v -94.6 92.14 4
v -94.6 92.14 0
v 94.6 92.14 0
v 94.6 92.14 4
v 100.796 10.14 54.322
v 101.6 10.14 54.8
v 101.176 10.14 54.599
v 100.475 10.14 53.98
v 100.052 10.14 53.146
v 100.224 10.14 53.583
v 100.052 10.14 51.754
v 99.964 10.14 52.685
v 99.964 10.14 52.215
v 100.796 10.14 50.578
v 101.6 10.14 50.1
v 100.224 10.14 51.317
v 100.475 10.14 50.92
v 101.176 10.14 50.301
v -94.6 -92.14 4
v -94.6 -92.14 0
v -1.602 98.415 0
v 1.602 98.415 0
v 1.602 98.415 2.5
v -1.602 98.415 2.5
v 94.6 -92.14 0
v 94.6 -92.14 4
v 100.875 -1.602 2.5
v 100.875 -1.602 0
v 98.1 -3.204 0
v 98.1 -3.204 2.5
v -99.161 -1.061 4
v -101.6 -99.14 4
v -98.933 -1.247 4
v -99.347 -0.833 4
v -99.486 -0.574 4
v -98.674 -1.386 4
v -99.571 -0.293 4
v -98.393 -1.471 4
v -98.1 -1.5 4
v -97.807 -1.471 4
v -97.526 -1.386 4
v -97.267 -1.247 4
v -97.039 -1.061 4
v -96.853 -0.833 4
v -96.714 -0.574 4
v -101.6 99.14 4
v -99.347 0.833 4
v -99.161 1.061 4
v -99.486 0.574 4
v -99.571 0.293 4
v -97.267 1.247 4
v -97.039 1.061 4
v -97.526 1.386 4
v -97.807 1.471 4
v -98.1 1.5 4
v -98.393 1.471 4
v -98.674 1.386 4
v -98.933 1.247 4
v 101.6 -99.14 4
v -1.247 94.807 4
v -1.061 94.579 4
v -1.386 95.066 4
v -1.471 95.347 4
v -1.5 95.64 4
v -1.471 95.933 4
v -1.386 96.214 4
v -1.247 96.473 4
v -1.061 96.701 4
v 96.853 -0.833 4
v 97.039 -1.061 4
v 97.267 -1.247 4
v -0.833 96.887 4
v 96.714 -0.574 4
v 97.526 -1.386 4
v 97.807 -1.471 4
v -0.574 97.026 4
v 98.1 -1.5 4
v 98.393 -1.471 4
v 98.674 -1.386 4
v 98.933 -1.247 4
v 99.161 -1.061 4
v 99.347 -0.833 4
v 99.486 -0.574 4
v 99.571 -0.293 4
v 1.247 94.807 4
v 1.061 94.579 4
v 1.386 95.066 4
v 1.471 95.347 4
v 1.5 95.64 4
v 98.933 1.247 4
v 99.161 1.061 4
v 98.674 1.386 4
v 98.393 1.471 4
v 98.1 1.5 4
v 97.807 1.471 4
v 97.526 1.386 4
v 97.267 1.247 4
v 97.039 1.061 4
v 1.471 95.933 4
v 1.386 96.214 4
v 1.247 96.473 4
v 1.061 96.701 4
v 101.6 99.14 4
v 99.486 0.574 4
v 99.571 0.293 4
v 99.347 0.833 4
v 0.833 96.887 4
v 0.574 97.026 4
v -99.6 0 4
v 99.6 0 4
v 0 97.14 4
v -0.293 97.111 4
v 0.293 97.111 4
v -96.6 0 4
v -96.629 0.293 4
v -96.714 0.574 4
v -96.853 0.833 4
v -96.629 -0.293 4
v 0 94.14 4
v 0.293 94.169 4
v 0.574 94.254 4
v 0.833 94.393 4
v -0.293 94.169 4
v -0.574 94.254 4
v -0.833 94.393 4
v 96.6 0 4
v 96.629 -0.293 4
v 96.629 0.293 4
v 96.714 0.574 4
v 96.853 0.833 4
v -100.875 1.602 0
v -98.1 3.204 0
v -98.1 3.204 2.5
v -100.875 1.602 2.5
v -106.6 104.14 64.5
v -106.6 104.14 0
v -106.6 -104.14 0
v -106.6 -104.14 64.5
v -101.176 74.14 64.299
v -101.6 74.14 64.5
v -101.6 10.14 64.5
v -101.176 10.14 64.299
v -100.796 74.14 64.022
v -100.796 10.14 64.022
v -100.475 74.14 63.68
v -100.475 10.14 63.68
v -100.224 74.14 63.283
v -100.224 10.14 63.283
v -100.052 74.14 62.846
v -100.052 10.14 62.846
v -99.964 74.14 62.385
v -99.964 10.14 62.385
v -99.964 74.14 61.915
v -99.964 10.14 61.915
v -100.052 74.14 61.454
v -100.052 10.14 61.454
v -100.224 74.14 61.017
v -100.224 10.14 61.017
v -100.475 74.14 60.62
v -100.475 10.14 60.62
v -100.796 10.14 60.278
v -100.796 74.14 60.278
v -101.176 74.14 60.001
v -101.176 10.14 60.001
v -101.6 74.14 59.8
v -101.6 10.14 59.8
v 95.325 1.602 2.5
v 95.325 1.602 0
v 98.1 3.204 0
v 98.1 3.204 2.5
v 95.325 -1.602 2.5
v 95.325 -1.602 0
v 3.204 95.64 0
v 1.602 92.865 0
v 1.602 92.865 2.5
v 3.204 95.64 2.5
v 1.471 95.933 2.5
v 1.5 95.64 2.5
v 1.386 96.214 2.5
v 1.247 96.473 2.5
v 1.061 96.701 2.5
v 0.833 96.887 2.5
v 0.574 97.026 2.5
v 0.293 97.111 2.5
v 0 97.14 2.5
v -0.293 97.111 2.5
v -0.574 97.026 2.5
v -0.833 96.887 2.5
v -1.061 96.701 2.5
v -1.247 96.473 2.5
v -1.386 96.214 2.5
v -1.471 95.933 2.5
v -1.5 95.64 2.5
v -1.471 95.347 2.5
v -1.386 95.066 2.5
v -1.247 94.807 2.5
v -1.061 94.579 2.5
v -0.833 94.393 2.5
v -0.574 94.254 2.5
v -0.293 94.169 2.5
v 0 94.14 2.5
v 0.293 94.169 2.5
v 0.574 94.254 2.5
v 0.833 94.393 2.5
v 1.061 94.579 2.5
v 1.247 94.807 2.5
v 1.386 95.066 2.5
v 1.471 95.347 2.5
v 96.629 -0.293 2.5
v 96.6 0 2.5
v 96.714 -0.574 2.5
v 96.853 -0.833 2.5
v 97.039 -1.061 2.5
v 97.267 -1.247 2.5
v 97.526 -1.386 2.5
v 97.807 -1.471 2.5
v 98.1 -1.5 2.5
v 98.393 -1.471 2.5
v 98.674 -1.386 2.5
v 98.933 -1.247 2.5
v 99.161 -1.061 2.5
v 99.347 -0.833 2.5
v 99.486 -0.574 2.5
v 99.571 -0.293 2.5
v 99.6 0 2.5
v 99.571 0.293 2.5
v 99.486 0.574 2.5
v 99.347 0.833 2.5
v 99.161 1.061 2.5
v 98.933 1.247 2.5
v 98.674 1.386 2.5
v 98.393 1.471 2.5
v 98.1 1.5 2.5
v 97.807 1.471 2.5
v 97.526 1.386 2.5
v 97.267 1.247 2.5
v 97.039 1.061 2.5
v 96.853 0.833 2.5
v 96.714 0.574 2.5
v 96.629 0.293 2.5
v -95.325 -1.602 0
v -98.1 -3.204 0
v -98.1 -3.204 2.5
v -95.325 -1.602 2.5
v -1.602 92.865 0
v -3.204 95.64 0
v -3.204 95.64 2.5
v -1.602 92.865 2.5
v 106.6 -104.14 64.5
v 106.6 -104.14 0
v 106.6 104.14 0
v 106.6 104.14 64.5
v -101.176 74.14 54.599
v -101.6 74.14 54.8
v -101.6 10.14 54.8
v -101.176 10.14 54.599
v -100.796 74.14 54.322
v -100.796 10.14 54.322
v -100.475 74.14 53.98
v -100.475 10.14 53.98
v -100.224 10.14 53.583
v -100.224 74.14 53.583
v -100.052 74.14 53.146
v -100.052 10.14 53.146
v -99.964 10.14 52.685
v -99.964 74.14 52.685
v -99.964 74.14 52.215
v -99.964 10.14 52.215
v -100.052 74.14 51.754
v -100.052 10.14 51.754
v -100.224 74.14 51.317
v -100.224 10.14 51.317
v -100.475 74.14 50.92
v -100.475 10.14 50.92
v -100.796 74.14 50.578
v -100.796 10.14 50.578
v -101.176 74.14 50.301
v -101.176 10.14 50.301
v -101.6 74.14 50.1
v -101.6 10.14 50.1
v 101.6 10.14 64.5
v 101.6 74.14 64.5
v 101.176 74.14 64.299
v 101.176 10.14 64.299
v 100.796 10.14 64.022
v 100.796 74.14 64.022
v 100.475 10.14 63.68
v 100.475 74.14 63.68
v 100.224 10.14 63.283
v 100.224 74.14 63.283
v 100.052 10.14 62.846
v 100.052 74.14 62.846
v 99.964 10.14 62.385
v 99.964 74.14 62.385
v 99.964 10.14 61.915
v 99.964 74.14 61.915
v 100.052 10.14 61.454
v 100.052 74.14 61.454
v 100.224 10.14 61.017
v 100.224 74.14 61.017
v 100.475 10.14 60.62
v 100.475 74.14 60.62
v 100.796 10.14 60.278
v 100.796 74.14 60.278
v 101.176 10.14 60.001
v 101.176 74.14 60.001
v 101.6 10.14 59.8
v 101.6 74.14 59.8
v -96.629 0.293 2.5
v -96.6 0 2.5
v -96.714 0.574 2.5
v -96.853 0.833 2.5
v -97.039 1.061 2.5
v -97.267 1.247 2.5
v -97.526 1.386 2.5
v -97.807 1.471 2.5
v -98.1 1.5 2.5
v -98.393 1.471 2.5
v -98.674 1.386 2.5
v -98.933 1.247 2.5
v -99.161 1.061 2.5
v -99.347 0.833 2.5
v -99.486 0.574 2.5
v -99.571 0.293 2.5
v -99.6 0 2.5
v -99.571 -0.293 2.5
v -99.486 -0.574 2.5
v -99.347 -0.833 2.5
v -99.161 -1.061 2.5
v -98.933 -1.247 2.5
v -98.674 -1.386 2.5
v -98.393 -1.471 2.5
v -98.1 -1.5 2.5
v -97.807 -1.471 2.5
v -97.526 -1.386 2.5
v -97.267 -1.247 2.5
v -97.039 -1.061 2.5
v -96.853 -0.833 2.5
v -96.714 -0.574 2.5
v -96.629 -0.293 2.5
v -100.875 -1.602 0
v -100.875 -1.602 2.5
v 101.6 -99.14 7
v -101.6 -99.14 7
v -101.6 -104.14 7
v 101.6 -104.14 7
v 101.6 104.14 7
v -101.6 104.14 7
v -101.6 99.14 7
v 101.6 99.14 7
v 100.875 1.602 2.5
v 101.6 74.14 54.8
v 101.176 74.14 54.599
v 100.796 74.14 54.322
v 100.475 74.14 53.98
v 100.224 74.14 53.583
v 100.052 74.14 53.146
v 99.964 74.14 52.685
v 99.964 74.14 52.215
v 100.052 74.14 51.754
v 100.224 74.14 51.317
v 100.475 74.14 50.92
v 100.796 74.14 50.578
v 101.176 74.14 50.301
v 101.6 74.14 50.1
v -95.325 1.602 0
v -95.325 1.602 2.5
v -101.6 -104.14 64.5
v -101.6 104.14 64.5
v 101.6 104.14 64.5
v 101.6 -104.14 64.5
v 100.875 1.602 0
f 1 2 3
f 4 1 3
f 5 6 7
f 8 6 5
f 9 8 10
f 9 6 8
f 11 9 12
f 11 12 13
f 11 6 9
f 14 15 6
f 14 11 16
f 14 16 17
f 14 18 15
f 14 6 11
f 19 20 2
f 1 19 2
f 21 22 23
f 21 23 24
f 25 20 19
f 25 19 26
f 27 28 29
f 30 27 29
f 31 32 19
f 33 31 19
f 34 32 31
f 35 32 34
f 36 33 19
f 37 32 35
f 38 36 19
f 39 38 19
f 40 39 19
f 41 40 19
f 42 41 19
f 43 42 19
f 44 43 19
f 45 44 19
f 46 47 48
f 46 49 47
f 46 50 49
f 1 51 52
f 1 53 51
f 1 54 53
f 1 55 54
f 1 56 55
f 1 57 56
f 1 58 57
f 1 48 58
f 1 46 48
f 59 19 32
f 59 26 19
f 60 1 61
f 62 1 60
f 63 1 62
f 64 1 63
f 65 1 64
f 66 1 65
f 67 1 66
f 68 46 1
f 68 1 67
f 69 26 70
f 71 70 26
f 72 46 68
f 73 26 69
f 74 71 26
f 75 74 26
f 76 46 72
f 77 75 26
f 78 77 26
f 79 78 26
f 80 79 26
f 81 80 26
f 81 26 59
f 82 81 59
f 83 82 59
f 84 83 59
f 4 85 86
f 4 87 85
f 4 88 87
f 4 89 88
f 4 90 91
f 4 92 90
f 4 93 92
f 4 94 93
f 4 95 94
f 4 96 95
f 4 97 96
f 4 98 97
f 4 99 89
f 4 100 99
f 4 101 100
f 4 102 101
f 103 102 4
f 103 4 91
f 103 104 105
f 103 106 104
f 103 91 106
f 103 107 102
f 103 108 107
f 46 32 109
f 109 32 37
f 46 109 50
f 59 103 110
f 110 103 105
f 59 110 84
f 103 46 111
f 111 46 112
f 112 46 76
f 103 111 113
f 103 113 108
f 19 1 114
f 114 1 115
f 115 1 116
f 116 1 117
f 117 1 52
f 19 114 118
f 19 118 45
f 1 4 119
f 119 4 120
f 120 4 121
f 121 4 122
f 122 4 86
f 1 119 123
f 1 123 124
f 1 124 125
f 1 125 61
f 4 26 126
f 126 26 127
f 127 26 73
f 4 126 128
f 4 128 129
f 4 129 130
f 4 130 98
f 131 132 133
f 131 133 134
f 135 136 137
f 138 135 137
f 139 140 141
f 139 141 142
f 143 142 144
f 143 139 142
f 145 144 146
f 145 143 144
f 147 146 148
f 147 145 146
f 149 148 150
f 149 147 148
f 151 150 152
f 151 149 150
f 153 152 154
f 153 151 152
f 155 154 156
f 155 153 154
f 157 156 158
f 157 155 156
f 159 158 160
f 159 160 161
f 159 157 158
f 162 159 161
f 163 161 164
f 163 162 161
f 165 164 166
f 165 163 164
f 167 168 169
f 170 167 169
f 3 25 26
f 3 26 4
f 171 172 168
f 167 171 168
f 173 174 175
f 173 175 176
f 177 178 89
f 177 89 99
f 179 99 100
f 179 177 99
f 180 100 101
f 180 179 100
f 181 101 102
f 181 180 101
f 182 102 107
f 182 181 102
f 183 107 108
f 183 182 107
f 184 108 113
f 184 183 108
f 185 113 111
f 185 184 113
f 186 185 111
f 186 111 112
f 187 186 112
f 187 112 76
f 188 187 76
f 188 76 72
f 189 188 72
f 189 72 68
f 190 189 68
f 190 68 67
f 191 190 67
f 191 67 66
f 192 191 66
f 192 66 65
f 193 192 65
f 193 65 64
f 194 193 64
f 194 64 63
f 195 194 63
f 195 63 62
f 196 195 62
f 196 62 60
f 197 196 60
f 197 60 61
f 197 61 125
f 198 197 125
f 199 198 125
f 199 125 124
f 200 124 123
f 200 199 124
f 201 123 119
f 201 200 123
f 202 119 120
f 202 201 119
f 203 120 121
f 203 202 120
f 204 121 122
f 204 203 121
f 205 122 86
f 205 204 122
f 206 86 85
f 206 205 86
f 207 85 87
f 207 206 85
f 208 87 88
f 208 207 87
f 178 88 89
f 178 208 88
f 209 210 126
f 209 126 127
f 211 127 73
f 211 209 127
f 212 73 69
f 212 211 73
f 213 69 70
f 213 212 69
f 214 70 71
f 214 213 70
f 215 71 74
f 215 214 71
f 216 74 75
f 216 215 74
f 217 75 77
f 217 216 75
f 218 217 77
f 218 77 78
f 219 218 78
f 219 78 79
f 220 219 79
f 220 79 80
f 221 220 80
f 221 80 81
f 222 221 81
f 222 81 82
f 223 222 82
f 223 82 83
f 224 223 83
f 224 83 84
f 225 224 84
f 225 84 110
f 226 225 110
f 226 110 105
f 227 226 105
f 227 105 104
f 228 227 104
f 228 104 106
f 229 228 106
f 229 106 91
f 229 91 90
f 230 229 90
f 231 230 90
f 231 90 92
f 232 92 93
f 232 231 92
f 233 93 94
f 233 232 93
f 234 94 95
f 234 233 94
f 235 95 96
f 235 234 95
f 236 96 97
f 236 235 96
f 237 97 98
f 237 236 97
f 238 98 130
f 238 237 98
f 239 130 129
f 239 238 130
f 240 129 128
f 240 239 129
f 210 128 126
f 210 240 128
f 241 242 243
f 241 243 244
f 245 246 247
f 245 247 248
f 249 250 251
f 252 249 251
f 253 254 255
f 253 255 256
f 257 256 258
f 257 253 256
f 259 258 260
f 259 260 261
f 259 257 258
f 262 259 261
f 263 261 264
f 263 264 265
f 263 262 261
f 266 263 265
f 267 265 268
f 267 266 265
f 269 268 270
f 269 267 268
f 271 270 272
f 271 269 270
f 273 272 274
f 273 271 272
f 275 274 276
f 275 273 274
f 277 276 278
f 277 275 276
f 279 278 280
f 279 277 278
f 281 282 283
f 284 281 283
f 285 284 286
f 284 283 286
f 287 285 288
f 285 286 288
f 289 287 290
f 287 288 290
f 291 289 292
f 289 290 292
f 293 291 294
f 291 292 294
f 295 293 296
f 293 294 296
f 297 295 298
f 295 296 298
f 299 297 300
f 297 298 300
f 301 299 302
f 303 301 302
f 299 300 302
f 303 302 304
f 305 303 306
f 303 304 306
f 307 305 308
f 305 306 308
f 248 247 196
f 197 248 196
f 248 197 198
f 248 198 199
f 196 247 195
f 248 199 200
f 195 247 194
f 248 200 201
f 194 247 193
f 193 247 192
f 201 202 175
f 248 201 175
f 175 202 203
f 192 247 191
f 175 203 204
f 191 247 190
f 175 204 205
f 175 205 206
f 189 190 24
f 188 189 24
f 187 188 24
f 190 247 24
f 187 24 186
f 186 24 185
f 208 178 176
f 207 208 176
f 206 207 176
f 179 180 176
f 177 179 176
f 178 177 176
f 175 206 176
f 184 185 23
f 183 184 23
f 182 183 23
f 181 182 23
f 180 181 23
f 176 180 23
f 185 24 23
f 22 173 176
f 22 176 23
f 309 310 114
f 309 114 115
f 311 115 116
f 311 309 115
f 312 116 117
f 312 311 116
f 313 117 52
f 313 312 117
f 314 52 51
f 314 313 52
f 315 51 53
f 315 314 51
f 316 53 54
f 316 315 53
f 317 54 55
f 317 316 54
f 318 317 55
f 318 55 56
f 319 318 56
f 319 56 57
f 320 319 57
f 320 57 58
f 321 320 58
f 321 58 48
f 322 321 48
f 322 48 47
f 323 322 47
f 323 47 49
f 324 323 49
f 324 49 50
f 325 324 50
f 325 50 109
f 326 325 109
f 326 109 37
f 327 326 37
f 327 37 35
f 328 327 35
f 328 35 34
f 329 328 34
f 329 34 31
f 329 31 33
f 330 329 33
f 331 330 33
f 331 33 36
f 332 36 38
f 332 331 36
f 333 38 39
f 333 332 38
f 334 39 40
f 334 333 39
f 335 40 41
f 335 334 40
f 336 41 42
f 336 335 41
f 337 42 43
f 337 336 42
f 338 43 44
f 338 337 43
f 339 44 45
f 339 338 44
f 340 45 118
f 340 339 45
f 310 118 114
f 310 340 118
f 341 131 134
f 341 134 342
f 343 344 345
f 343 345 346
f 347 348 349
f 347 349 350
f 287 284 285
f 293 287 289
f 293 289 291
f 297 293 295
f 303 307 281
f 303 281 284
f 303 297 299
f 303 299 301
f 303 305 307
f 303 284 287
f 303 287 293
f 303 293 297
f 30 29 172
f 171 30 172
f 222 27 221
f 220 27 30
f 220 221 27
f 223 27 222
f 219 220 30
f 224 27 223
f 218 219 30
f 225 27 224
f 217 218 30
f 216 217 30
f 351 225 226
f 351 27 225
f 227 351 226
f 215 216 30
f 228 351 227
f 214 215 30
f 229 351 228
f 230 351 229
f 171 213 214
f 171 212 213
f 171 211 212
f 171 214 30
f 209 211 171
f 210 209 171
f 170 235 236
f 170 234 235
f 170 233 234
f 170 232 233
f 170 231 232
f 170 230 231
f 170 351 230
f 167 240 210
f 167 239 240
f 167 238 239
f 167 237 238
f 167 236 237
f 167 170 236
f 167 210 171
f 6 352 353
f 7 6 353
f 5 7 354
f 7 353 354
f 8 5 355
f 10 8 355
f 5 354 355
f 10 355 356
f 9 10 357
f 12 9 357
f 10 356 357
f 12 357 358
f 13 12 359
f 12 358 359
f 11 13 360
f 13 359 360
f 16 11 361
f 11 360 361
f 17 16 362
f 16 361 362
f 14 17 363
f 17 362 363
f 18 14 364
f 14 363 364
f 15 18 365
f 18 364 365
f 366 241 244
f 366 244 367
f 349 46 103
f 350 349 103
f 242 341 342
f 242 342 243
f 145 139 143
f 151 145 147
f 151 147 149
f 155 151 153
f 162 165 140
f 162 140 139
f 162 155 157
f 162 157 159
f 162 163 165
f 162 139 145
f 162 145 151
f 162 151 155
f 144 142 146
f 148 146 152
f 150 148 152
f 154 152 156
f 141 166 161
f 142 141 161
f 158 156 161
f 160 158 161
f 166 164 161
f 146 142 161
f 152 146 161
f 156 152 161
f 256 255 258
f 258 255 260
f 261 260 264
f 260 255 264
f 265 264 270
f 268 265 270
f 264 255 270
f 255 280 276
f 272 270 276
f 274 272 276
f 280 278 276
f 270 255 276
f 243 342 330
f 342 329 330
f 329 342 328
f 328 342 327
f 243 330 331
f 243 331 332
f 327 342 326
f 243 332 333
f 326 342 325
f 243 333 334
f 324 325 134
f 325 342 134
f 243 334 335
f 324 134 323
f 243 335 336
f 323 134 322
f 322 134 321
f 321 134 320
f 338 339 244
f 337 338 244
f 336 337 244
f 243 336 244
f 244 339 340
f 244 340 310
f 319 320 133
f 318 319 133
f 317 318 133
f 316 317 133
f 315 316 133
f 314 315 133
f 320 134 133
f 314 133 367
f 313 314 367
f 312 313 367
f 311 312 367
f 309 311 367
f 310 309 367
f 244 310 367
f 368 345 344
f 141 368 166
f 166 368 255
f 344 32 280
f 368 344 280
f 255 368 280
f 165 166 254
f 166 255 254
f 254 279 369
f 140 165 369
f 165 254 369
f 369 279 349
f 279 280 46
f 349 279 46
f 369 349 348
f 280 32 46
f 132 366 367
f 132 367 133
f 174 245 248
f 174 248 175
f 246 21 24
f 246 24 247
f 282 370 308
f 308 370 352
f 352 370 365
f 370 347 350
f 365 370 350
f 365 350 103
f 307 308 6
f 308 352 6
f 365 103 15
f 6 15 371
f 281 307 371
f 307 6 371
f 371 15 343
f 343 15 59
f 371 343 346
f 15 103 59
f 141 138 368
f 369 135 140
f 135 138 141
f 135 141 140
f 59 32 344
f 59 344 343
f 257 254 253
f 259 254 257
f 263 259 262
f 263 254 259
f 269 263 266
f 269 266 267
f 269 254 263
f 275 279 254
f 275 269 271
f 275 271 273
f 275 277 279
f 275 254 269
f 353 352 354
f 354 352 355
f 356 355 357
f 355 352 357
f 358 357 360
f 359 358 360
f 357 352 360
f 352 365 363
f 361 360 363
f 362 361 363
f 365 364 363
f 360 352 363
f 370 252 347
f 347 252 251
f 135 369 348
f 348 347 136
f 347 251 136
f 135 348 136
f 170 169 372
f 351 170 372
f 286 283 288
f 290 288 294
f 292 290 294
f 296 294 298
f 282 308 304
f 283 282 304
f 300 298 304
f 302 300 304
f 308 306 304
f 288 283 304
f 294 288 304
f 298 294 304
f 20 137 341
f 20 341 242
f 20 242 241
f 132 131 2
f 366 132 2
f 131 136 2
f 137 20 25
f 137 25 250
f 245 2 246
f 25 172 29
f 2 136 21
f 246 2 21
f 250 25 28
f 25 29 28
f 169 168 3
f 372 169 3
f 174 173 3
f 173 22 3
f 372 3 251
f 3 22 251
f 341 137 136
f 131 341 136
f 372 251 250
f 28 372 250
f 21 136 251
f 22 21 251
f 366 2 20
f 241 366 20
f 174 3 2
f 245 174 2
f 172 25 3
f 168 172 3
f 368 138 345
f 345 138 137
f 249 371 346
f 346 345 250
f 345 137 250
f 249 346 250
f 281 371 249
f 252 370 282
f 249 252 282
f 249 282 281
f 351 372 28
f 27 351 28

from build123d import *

# Parameters (mm, degrees)
SKETCH1_W           = 213.2
SKETCH1_H           = 208.28
SKETCH1_W_2         = 203.2
SKETCH1_H_2         = 198.28
BOSS_EXTRUDE1_DEPTH = 7
SKETCH2_W           = 203.2
SKETCH2_H           = 198.28
SKETCH2_R           = 1.5
SKETCH2_W_2         = 189.2
SKETCH2_H_2         = 184.28
BOSS_EXTRUDE2_DEPTH = 4
BOSS_EXTRUDE3_DEPTH = 57.5
BOSS_EXTRUDE4_START = -30
BOSS_EXTRUDE4_DEPTH = 64
CUT_EXTRUDE1_START  = -4
CUT_EXTRUDE1_DEPTH  = 2.5


with BuildPart() as part:
    # Sketch1 → Boss-Extrude1 (new body)
    with BuildSketch(Plane.XY):
        Rectangle(SKETCH1_W, SKETCH1_H)
        Rectangle(SKETCH1_W_2, SKETCH1_H_2, mode=Mode.SUBTRACT)
    extrude(amount=BOSS_EXTRUDE1_DEPTH)

    # Sketch2 → Boss-Extrude2 (add)
    with BuildSketch(Plane.XY):
        Rectangle(SKETCH2_W, SKETCH2_H)
        with Locations((0, 95.64)):
            Circle(SKETCH2_R, mode=Mode.SUBTRACT)
        with Locations((-98.1, 0)):
            Circle(SKETCH2_R, mode=Mode.SUBTRACT)
        with Locations(Location((98.1, 0, 0), (0, 0, 180))):
            Circle(SKETCH2_R, mode=Mode.SUBTRACT)
        Rectangle(SKETCH2_W_2, SKETCH2_H_2, mode=Mode.SUBTRACT)
    extrude(amount=BOSS_EXTRUDE2_DEPTH)

    # Sketch3 → Boss-Extrude3 (add)
    with BuildSketch(Plane.XY.offset(7)):
        Polygon((-106.6, 104.14), (-106.6, -104.14), (-101.6, -104.14), (-101.6, -99.14), (-101.6, 99.14), (-101.6, 104.14), align=None)
        Polygon((101.6, -99.14), (101.6, -104.14), (106.6, -104.14), (106.6, 104.14), (101.6, 104.14), (101.6, 99.14), align=None)
    extrude(amount=BOSS_EXTRUDE3_DEPTH)

    # Sketch4 → Boss-Extrude4 (add)
    with BuildSketch(Plane(origin=(0, 104.14, 0), x_dir=(1, 0, 0), z_dir=(0, 1, 0)).offset(BOSS_EXTRUDE4_START)):
        with BuildLine():
            Line((-101.6, -59.8), (-101.6, -64.5))
            ThreePointArc((-101.6, -64.5), (-99.952936105, -62.15), (-101.6, -59.8))
        make_face()
        with BuildLine():
            Line((101.6, -59.8), (101.6, -64.5))
            ThreePointArc((101.6, -64.5), (99.952936105, -62.15), (101.6, -59.8))
        make_face()
        with BuildLine():
            Line((-101.6, -50.1), (-101.6, -54.8))
            ThreePointArc((-101.6, -54.8), (-99.952936105, -52.45), (-101.6, -50.1))
        make_face()
        with BuildLine():
            Line((101.6, -50.1), (101.6, -54.8))
            ThreePointArc((101.6, -54.8), (99.952936105, -52.45), (101.6, -50.1))
        make_face()
    extrude(amount=-BOSS_EXTRUDE4_DEPTH)

    # Sketch5 → Cut-Extrude1 (cut)
    with BuildSketch(Plane.XY.offset(4).offset(CUT_EXTRUDE1_START)):
        Polygon((-95.325, -1.602146997), (-95.325, 1.602146997), (-98.1, 3.204293994), (-100.875, 1.602146997), (-100.875, -1.602146997), (-98.1, -3.204293994), align=None)
        Polygon((98.1, -3.204293994), (95.325, -1.602146997), (95.325, 1.602146997), (98.1, 3.204293994), (100.875, 1.602146997), (100.875, -1.602146997), align=None)
        Polygon((1.602146997, 92.865), (3.204293994, 95.64), (1.602146997, 98.415), (-1.602146997, 98.415), (-3.204293994, 95.64), (-1.602146997, 92.865), align=None)
    extrude(amount=CUT_EXTRUDE1_DEPTH, mode=Mode.SUBTRACT)


solid = part.part
